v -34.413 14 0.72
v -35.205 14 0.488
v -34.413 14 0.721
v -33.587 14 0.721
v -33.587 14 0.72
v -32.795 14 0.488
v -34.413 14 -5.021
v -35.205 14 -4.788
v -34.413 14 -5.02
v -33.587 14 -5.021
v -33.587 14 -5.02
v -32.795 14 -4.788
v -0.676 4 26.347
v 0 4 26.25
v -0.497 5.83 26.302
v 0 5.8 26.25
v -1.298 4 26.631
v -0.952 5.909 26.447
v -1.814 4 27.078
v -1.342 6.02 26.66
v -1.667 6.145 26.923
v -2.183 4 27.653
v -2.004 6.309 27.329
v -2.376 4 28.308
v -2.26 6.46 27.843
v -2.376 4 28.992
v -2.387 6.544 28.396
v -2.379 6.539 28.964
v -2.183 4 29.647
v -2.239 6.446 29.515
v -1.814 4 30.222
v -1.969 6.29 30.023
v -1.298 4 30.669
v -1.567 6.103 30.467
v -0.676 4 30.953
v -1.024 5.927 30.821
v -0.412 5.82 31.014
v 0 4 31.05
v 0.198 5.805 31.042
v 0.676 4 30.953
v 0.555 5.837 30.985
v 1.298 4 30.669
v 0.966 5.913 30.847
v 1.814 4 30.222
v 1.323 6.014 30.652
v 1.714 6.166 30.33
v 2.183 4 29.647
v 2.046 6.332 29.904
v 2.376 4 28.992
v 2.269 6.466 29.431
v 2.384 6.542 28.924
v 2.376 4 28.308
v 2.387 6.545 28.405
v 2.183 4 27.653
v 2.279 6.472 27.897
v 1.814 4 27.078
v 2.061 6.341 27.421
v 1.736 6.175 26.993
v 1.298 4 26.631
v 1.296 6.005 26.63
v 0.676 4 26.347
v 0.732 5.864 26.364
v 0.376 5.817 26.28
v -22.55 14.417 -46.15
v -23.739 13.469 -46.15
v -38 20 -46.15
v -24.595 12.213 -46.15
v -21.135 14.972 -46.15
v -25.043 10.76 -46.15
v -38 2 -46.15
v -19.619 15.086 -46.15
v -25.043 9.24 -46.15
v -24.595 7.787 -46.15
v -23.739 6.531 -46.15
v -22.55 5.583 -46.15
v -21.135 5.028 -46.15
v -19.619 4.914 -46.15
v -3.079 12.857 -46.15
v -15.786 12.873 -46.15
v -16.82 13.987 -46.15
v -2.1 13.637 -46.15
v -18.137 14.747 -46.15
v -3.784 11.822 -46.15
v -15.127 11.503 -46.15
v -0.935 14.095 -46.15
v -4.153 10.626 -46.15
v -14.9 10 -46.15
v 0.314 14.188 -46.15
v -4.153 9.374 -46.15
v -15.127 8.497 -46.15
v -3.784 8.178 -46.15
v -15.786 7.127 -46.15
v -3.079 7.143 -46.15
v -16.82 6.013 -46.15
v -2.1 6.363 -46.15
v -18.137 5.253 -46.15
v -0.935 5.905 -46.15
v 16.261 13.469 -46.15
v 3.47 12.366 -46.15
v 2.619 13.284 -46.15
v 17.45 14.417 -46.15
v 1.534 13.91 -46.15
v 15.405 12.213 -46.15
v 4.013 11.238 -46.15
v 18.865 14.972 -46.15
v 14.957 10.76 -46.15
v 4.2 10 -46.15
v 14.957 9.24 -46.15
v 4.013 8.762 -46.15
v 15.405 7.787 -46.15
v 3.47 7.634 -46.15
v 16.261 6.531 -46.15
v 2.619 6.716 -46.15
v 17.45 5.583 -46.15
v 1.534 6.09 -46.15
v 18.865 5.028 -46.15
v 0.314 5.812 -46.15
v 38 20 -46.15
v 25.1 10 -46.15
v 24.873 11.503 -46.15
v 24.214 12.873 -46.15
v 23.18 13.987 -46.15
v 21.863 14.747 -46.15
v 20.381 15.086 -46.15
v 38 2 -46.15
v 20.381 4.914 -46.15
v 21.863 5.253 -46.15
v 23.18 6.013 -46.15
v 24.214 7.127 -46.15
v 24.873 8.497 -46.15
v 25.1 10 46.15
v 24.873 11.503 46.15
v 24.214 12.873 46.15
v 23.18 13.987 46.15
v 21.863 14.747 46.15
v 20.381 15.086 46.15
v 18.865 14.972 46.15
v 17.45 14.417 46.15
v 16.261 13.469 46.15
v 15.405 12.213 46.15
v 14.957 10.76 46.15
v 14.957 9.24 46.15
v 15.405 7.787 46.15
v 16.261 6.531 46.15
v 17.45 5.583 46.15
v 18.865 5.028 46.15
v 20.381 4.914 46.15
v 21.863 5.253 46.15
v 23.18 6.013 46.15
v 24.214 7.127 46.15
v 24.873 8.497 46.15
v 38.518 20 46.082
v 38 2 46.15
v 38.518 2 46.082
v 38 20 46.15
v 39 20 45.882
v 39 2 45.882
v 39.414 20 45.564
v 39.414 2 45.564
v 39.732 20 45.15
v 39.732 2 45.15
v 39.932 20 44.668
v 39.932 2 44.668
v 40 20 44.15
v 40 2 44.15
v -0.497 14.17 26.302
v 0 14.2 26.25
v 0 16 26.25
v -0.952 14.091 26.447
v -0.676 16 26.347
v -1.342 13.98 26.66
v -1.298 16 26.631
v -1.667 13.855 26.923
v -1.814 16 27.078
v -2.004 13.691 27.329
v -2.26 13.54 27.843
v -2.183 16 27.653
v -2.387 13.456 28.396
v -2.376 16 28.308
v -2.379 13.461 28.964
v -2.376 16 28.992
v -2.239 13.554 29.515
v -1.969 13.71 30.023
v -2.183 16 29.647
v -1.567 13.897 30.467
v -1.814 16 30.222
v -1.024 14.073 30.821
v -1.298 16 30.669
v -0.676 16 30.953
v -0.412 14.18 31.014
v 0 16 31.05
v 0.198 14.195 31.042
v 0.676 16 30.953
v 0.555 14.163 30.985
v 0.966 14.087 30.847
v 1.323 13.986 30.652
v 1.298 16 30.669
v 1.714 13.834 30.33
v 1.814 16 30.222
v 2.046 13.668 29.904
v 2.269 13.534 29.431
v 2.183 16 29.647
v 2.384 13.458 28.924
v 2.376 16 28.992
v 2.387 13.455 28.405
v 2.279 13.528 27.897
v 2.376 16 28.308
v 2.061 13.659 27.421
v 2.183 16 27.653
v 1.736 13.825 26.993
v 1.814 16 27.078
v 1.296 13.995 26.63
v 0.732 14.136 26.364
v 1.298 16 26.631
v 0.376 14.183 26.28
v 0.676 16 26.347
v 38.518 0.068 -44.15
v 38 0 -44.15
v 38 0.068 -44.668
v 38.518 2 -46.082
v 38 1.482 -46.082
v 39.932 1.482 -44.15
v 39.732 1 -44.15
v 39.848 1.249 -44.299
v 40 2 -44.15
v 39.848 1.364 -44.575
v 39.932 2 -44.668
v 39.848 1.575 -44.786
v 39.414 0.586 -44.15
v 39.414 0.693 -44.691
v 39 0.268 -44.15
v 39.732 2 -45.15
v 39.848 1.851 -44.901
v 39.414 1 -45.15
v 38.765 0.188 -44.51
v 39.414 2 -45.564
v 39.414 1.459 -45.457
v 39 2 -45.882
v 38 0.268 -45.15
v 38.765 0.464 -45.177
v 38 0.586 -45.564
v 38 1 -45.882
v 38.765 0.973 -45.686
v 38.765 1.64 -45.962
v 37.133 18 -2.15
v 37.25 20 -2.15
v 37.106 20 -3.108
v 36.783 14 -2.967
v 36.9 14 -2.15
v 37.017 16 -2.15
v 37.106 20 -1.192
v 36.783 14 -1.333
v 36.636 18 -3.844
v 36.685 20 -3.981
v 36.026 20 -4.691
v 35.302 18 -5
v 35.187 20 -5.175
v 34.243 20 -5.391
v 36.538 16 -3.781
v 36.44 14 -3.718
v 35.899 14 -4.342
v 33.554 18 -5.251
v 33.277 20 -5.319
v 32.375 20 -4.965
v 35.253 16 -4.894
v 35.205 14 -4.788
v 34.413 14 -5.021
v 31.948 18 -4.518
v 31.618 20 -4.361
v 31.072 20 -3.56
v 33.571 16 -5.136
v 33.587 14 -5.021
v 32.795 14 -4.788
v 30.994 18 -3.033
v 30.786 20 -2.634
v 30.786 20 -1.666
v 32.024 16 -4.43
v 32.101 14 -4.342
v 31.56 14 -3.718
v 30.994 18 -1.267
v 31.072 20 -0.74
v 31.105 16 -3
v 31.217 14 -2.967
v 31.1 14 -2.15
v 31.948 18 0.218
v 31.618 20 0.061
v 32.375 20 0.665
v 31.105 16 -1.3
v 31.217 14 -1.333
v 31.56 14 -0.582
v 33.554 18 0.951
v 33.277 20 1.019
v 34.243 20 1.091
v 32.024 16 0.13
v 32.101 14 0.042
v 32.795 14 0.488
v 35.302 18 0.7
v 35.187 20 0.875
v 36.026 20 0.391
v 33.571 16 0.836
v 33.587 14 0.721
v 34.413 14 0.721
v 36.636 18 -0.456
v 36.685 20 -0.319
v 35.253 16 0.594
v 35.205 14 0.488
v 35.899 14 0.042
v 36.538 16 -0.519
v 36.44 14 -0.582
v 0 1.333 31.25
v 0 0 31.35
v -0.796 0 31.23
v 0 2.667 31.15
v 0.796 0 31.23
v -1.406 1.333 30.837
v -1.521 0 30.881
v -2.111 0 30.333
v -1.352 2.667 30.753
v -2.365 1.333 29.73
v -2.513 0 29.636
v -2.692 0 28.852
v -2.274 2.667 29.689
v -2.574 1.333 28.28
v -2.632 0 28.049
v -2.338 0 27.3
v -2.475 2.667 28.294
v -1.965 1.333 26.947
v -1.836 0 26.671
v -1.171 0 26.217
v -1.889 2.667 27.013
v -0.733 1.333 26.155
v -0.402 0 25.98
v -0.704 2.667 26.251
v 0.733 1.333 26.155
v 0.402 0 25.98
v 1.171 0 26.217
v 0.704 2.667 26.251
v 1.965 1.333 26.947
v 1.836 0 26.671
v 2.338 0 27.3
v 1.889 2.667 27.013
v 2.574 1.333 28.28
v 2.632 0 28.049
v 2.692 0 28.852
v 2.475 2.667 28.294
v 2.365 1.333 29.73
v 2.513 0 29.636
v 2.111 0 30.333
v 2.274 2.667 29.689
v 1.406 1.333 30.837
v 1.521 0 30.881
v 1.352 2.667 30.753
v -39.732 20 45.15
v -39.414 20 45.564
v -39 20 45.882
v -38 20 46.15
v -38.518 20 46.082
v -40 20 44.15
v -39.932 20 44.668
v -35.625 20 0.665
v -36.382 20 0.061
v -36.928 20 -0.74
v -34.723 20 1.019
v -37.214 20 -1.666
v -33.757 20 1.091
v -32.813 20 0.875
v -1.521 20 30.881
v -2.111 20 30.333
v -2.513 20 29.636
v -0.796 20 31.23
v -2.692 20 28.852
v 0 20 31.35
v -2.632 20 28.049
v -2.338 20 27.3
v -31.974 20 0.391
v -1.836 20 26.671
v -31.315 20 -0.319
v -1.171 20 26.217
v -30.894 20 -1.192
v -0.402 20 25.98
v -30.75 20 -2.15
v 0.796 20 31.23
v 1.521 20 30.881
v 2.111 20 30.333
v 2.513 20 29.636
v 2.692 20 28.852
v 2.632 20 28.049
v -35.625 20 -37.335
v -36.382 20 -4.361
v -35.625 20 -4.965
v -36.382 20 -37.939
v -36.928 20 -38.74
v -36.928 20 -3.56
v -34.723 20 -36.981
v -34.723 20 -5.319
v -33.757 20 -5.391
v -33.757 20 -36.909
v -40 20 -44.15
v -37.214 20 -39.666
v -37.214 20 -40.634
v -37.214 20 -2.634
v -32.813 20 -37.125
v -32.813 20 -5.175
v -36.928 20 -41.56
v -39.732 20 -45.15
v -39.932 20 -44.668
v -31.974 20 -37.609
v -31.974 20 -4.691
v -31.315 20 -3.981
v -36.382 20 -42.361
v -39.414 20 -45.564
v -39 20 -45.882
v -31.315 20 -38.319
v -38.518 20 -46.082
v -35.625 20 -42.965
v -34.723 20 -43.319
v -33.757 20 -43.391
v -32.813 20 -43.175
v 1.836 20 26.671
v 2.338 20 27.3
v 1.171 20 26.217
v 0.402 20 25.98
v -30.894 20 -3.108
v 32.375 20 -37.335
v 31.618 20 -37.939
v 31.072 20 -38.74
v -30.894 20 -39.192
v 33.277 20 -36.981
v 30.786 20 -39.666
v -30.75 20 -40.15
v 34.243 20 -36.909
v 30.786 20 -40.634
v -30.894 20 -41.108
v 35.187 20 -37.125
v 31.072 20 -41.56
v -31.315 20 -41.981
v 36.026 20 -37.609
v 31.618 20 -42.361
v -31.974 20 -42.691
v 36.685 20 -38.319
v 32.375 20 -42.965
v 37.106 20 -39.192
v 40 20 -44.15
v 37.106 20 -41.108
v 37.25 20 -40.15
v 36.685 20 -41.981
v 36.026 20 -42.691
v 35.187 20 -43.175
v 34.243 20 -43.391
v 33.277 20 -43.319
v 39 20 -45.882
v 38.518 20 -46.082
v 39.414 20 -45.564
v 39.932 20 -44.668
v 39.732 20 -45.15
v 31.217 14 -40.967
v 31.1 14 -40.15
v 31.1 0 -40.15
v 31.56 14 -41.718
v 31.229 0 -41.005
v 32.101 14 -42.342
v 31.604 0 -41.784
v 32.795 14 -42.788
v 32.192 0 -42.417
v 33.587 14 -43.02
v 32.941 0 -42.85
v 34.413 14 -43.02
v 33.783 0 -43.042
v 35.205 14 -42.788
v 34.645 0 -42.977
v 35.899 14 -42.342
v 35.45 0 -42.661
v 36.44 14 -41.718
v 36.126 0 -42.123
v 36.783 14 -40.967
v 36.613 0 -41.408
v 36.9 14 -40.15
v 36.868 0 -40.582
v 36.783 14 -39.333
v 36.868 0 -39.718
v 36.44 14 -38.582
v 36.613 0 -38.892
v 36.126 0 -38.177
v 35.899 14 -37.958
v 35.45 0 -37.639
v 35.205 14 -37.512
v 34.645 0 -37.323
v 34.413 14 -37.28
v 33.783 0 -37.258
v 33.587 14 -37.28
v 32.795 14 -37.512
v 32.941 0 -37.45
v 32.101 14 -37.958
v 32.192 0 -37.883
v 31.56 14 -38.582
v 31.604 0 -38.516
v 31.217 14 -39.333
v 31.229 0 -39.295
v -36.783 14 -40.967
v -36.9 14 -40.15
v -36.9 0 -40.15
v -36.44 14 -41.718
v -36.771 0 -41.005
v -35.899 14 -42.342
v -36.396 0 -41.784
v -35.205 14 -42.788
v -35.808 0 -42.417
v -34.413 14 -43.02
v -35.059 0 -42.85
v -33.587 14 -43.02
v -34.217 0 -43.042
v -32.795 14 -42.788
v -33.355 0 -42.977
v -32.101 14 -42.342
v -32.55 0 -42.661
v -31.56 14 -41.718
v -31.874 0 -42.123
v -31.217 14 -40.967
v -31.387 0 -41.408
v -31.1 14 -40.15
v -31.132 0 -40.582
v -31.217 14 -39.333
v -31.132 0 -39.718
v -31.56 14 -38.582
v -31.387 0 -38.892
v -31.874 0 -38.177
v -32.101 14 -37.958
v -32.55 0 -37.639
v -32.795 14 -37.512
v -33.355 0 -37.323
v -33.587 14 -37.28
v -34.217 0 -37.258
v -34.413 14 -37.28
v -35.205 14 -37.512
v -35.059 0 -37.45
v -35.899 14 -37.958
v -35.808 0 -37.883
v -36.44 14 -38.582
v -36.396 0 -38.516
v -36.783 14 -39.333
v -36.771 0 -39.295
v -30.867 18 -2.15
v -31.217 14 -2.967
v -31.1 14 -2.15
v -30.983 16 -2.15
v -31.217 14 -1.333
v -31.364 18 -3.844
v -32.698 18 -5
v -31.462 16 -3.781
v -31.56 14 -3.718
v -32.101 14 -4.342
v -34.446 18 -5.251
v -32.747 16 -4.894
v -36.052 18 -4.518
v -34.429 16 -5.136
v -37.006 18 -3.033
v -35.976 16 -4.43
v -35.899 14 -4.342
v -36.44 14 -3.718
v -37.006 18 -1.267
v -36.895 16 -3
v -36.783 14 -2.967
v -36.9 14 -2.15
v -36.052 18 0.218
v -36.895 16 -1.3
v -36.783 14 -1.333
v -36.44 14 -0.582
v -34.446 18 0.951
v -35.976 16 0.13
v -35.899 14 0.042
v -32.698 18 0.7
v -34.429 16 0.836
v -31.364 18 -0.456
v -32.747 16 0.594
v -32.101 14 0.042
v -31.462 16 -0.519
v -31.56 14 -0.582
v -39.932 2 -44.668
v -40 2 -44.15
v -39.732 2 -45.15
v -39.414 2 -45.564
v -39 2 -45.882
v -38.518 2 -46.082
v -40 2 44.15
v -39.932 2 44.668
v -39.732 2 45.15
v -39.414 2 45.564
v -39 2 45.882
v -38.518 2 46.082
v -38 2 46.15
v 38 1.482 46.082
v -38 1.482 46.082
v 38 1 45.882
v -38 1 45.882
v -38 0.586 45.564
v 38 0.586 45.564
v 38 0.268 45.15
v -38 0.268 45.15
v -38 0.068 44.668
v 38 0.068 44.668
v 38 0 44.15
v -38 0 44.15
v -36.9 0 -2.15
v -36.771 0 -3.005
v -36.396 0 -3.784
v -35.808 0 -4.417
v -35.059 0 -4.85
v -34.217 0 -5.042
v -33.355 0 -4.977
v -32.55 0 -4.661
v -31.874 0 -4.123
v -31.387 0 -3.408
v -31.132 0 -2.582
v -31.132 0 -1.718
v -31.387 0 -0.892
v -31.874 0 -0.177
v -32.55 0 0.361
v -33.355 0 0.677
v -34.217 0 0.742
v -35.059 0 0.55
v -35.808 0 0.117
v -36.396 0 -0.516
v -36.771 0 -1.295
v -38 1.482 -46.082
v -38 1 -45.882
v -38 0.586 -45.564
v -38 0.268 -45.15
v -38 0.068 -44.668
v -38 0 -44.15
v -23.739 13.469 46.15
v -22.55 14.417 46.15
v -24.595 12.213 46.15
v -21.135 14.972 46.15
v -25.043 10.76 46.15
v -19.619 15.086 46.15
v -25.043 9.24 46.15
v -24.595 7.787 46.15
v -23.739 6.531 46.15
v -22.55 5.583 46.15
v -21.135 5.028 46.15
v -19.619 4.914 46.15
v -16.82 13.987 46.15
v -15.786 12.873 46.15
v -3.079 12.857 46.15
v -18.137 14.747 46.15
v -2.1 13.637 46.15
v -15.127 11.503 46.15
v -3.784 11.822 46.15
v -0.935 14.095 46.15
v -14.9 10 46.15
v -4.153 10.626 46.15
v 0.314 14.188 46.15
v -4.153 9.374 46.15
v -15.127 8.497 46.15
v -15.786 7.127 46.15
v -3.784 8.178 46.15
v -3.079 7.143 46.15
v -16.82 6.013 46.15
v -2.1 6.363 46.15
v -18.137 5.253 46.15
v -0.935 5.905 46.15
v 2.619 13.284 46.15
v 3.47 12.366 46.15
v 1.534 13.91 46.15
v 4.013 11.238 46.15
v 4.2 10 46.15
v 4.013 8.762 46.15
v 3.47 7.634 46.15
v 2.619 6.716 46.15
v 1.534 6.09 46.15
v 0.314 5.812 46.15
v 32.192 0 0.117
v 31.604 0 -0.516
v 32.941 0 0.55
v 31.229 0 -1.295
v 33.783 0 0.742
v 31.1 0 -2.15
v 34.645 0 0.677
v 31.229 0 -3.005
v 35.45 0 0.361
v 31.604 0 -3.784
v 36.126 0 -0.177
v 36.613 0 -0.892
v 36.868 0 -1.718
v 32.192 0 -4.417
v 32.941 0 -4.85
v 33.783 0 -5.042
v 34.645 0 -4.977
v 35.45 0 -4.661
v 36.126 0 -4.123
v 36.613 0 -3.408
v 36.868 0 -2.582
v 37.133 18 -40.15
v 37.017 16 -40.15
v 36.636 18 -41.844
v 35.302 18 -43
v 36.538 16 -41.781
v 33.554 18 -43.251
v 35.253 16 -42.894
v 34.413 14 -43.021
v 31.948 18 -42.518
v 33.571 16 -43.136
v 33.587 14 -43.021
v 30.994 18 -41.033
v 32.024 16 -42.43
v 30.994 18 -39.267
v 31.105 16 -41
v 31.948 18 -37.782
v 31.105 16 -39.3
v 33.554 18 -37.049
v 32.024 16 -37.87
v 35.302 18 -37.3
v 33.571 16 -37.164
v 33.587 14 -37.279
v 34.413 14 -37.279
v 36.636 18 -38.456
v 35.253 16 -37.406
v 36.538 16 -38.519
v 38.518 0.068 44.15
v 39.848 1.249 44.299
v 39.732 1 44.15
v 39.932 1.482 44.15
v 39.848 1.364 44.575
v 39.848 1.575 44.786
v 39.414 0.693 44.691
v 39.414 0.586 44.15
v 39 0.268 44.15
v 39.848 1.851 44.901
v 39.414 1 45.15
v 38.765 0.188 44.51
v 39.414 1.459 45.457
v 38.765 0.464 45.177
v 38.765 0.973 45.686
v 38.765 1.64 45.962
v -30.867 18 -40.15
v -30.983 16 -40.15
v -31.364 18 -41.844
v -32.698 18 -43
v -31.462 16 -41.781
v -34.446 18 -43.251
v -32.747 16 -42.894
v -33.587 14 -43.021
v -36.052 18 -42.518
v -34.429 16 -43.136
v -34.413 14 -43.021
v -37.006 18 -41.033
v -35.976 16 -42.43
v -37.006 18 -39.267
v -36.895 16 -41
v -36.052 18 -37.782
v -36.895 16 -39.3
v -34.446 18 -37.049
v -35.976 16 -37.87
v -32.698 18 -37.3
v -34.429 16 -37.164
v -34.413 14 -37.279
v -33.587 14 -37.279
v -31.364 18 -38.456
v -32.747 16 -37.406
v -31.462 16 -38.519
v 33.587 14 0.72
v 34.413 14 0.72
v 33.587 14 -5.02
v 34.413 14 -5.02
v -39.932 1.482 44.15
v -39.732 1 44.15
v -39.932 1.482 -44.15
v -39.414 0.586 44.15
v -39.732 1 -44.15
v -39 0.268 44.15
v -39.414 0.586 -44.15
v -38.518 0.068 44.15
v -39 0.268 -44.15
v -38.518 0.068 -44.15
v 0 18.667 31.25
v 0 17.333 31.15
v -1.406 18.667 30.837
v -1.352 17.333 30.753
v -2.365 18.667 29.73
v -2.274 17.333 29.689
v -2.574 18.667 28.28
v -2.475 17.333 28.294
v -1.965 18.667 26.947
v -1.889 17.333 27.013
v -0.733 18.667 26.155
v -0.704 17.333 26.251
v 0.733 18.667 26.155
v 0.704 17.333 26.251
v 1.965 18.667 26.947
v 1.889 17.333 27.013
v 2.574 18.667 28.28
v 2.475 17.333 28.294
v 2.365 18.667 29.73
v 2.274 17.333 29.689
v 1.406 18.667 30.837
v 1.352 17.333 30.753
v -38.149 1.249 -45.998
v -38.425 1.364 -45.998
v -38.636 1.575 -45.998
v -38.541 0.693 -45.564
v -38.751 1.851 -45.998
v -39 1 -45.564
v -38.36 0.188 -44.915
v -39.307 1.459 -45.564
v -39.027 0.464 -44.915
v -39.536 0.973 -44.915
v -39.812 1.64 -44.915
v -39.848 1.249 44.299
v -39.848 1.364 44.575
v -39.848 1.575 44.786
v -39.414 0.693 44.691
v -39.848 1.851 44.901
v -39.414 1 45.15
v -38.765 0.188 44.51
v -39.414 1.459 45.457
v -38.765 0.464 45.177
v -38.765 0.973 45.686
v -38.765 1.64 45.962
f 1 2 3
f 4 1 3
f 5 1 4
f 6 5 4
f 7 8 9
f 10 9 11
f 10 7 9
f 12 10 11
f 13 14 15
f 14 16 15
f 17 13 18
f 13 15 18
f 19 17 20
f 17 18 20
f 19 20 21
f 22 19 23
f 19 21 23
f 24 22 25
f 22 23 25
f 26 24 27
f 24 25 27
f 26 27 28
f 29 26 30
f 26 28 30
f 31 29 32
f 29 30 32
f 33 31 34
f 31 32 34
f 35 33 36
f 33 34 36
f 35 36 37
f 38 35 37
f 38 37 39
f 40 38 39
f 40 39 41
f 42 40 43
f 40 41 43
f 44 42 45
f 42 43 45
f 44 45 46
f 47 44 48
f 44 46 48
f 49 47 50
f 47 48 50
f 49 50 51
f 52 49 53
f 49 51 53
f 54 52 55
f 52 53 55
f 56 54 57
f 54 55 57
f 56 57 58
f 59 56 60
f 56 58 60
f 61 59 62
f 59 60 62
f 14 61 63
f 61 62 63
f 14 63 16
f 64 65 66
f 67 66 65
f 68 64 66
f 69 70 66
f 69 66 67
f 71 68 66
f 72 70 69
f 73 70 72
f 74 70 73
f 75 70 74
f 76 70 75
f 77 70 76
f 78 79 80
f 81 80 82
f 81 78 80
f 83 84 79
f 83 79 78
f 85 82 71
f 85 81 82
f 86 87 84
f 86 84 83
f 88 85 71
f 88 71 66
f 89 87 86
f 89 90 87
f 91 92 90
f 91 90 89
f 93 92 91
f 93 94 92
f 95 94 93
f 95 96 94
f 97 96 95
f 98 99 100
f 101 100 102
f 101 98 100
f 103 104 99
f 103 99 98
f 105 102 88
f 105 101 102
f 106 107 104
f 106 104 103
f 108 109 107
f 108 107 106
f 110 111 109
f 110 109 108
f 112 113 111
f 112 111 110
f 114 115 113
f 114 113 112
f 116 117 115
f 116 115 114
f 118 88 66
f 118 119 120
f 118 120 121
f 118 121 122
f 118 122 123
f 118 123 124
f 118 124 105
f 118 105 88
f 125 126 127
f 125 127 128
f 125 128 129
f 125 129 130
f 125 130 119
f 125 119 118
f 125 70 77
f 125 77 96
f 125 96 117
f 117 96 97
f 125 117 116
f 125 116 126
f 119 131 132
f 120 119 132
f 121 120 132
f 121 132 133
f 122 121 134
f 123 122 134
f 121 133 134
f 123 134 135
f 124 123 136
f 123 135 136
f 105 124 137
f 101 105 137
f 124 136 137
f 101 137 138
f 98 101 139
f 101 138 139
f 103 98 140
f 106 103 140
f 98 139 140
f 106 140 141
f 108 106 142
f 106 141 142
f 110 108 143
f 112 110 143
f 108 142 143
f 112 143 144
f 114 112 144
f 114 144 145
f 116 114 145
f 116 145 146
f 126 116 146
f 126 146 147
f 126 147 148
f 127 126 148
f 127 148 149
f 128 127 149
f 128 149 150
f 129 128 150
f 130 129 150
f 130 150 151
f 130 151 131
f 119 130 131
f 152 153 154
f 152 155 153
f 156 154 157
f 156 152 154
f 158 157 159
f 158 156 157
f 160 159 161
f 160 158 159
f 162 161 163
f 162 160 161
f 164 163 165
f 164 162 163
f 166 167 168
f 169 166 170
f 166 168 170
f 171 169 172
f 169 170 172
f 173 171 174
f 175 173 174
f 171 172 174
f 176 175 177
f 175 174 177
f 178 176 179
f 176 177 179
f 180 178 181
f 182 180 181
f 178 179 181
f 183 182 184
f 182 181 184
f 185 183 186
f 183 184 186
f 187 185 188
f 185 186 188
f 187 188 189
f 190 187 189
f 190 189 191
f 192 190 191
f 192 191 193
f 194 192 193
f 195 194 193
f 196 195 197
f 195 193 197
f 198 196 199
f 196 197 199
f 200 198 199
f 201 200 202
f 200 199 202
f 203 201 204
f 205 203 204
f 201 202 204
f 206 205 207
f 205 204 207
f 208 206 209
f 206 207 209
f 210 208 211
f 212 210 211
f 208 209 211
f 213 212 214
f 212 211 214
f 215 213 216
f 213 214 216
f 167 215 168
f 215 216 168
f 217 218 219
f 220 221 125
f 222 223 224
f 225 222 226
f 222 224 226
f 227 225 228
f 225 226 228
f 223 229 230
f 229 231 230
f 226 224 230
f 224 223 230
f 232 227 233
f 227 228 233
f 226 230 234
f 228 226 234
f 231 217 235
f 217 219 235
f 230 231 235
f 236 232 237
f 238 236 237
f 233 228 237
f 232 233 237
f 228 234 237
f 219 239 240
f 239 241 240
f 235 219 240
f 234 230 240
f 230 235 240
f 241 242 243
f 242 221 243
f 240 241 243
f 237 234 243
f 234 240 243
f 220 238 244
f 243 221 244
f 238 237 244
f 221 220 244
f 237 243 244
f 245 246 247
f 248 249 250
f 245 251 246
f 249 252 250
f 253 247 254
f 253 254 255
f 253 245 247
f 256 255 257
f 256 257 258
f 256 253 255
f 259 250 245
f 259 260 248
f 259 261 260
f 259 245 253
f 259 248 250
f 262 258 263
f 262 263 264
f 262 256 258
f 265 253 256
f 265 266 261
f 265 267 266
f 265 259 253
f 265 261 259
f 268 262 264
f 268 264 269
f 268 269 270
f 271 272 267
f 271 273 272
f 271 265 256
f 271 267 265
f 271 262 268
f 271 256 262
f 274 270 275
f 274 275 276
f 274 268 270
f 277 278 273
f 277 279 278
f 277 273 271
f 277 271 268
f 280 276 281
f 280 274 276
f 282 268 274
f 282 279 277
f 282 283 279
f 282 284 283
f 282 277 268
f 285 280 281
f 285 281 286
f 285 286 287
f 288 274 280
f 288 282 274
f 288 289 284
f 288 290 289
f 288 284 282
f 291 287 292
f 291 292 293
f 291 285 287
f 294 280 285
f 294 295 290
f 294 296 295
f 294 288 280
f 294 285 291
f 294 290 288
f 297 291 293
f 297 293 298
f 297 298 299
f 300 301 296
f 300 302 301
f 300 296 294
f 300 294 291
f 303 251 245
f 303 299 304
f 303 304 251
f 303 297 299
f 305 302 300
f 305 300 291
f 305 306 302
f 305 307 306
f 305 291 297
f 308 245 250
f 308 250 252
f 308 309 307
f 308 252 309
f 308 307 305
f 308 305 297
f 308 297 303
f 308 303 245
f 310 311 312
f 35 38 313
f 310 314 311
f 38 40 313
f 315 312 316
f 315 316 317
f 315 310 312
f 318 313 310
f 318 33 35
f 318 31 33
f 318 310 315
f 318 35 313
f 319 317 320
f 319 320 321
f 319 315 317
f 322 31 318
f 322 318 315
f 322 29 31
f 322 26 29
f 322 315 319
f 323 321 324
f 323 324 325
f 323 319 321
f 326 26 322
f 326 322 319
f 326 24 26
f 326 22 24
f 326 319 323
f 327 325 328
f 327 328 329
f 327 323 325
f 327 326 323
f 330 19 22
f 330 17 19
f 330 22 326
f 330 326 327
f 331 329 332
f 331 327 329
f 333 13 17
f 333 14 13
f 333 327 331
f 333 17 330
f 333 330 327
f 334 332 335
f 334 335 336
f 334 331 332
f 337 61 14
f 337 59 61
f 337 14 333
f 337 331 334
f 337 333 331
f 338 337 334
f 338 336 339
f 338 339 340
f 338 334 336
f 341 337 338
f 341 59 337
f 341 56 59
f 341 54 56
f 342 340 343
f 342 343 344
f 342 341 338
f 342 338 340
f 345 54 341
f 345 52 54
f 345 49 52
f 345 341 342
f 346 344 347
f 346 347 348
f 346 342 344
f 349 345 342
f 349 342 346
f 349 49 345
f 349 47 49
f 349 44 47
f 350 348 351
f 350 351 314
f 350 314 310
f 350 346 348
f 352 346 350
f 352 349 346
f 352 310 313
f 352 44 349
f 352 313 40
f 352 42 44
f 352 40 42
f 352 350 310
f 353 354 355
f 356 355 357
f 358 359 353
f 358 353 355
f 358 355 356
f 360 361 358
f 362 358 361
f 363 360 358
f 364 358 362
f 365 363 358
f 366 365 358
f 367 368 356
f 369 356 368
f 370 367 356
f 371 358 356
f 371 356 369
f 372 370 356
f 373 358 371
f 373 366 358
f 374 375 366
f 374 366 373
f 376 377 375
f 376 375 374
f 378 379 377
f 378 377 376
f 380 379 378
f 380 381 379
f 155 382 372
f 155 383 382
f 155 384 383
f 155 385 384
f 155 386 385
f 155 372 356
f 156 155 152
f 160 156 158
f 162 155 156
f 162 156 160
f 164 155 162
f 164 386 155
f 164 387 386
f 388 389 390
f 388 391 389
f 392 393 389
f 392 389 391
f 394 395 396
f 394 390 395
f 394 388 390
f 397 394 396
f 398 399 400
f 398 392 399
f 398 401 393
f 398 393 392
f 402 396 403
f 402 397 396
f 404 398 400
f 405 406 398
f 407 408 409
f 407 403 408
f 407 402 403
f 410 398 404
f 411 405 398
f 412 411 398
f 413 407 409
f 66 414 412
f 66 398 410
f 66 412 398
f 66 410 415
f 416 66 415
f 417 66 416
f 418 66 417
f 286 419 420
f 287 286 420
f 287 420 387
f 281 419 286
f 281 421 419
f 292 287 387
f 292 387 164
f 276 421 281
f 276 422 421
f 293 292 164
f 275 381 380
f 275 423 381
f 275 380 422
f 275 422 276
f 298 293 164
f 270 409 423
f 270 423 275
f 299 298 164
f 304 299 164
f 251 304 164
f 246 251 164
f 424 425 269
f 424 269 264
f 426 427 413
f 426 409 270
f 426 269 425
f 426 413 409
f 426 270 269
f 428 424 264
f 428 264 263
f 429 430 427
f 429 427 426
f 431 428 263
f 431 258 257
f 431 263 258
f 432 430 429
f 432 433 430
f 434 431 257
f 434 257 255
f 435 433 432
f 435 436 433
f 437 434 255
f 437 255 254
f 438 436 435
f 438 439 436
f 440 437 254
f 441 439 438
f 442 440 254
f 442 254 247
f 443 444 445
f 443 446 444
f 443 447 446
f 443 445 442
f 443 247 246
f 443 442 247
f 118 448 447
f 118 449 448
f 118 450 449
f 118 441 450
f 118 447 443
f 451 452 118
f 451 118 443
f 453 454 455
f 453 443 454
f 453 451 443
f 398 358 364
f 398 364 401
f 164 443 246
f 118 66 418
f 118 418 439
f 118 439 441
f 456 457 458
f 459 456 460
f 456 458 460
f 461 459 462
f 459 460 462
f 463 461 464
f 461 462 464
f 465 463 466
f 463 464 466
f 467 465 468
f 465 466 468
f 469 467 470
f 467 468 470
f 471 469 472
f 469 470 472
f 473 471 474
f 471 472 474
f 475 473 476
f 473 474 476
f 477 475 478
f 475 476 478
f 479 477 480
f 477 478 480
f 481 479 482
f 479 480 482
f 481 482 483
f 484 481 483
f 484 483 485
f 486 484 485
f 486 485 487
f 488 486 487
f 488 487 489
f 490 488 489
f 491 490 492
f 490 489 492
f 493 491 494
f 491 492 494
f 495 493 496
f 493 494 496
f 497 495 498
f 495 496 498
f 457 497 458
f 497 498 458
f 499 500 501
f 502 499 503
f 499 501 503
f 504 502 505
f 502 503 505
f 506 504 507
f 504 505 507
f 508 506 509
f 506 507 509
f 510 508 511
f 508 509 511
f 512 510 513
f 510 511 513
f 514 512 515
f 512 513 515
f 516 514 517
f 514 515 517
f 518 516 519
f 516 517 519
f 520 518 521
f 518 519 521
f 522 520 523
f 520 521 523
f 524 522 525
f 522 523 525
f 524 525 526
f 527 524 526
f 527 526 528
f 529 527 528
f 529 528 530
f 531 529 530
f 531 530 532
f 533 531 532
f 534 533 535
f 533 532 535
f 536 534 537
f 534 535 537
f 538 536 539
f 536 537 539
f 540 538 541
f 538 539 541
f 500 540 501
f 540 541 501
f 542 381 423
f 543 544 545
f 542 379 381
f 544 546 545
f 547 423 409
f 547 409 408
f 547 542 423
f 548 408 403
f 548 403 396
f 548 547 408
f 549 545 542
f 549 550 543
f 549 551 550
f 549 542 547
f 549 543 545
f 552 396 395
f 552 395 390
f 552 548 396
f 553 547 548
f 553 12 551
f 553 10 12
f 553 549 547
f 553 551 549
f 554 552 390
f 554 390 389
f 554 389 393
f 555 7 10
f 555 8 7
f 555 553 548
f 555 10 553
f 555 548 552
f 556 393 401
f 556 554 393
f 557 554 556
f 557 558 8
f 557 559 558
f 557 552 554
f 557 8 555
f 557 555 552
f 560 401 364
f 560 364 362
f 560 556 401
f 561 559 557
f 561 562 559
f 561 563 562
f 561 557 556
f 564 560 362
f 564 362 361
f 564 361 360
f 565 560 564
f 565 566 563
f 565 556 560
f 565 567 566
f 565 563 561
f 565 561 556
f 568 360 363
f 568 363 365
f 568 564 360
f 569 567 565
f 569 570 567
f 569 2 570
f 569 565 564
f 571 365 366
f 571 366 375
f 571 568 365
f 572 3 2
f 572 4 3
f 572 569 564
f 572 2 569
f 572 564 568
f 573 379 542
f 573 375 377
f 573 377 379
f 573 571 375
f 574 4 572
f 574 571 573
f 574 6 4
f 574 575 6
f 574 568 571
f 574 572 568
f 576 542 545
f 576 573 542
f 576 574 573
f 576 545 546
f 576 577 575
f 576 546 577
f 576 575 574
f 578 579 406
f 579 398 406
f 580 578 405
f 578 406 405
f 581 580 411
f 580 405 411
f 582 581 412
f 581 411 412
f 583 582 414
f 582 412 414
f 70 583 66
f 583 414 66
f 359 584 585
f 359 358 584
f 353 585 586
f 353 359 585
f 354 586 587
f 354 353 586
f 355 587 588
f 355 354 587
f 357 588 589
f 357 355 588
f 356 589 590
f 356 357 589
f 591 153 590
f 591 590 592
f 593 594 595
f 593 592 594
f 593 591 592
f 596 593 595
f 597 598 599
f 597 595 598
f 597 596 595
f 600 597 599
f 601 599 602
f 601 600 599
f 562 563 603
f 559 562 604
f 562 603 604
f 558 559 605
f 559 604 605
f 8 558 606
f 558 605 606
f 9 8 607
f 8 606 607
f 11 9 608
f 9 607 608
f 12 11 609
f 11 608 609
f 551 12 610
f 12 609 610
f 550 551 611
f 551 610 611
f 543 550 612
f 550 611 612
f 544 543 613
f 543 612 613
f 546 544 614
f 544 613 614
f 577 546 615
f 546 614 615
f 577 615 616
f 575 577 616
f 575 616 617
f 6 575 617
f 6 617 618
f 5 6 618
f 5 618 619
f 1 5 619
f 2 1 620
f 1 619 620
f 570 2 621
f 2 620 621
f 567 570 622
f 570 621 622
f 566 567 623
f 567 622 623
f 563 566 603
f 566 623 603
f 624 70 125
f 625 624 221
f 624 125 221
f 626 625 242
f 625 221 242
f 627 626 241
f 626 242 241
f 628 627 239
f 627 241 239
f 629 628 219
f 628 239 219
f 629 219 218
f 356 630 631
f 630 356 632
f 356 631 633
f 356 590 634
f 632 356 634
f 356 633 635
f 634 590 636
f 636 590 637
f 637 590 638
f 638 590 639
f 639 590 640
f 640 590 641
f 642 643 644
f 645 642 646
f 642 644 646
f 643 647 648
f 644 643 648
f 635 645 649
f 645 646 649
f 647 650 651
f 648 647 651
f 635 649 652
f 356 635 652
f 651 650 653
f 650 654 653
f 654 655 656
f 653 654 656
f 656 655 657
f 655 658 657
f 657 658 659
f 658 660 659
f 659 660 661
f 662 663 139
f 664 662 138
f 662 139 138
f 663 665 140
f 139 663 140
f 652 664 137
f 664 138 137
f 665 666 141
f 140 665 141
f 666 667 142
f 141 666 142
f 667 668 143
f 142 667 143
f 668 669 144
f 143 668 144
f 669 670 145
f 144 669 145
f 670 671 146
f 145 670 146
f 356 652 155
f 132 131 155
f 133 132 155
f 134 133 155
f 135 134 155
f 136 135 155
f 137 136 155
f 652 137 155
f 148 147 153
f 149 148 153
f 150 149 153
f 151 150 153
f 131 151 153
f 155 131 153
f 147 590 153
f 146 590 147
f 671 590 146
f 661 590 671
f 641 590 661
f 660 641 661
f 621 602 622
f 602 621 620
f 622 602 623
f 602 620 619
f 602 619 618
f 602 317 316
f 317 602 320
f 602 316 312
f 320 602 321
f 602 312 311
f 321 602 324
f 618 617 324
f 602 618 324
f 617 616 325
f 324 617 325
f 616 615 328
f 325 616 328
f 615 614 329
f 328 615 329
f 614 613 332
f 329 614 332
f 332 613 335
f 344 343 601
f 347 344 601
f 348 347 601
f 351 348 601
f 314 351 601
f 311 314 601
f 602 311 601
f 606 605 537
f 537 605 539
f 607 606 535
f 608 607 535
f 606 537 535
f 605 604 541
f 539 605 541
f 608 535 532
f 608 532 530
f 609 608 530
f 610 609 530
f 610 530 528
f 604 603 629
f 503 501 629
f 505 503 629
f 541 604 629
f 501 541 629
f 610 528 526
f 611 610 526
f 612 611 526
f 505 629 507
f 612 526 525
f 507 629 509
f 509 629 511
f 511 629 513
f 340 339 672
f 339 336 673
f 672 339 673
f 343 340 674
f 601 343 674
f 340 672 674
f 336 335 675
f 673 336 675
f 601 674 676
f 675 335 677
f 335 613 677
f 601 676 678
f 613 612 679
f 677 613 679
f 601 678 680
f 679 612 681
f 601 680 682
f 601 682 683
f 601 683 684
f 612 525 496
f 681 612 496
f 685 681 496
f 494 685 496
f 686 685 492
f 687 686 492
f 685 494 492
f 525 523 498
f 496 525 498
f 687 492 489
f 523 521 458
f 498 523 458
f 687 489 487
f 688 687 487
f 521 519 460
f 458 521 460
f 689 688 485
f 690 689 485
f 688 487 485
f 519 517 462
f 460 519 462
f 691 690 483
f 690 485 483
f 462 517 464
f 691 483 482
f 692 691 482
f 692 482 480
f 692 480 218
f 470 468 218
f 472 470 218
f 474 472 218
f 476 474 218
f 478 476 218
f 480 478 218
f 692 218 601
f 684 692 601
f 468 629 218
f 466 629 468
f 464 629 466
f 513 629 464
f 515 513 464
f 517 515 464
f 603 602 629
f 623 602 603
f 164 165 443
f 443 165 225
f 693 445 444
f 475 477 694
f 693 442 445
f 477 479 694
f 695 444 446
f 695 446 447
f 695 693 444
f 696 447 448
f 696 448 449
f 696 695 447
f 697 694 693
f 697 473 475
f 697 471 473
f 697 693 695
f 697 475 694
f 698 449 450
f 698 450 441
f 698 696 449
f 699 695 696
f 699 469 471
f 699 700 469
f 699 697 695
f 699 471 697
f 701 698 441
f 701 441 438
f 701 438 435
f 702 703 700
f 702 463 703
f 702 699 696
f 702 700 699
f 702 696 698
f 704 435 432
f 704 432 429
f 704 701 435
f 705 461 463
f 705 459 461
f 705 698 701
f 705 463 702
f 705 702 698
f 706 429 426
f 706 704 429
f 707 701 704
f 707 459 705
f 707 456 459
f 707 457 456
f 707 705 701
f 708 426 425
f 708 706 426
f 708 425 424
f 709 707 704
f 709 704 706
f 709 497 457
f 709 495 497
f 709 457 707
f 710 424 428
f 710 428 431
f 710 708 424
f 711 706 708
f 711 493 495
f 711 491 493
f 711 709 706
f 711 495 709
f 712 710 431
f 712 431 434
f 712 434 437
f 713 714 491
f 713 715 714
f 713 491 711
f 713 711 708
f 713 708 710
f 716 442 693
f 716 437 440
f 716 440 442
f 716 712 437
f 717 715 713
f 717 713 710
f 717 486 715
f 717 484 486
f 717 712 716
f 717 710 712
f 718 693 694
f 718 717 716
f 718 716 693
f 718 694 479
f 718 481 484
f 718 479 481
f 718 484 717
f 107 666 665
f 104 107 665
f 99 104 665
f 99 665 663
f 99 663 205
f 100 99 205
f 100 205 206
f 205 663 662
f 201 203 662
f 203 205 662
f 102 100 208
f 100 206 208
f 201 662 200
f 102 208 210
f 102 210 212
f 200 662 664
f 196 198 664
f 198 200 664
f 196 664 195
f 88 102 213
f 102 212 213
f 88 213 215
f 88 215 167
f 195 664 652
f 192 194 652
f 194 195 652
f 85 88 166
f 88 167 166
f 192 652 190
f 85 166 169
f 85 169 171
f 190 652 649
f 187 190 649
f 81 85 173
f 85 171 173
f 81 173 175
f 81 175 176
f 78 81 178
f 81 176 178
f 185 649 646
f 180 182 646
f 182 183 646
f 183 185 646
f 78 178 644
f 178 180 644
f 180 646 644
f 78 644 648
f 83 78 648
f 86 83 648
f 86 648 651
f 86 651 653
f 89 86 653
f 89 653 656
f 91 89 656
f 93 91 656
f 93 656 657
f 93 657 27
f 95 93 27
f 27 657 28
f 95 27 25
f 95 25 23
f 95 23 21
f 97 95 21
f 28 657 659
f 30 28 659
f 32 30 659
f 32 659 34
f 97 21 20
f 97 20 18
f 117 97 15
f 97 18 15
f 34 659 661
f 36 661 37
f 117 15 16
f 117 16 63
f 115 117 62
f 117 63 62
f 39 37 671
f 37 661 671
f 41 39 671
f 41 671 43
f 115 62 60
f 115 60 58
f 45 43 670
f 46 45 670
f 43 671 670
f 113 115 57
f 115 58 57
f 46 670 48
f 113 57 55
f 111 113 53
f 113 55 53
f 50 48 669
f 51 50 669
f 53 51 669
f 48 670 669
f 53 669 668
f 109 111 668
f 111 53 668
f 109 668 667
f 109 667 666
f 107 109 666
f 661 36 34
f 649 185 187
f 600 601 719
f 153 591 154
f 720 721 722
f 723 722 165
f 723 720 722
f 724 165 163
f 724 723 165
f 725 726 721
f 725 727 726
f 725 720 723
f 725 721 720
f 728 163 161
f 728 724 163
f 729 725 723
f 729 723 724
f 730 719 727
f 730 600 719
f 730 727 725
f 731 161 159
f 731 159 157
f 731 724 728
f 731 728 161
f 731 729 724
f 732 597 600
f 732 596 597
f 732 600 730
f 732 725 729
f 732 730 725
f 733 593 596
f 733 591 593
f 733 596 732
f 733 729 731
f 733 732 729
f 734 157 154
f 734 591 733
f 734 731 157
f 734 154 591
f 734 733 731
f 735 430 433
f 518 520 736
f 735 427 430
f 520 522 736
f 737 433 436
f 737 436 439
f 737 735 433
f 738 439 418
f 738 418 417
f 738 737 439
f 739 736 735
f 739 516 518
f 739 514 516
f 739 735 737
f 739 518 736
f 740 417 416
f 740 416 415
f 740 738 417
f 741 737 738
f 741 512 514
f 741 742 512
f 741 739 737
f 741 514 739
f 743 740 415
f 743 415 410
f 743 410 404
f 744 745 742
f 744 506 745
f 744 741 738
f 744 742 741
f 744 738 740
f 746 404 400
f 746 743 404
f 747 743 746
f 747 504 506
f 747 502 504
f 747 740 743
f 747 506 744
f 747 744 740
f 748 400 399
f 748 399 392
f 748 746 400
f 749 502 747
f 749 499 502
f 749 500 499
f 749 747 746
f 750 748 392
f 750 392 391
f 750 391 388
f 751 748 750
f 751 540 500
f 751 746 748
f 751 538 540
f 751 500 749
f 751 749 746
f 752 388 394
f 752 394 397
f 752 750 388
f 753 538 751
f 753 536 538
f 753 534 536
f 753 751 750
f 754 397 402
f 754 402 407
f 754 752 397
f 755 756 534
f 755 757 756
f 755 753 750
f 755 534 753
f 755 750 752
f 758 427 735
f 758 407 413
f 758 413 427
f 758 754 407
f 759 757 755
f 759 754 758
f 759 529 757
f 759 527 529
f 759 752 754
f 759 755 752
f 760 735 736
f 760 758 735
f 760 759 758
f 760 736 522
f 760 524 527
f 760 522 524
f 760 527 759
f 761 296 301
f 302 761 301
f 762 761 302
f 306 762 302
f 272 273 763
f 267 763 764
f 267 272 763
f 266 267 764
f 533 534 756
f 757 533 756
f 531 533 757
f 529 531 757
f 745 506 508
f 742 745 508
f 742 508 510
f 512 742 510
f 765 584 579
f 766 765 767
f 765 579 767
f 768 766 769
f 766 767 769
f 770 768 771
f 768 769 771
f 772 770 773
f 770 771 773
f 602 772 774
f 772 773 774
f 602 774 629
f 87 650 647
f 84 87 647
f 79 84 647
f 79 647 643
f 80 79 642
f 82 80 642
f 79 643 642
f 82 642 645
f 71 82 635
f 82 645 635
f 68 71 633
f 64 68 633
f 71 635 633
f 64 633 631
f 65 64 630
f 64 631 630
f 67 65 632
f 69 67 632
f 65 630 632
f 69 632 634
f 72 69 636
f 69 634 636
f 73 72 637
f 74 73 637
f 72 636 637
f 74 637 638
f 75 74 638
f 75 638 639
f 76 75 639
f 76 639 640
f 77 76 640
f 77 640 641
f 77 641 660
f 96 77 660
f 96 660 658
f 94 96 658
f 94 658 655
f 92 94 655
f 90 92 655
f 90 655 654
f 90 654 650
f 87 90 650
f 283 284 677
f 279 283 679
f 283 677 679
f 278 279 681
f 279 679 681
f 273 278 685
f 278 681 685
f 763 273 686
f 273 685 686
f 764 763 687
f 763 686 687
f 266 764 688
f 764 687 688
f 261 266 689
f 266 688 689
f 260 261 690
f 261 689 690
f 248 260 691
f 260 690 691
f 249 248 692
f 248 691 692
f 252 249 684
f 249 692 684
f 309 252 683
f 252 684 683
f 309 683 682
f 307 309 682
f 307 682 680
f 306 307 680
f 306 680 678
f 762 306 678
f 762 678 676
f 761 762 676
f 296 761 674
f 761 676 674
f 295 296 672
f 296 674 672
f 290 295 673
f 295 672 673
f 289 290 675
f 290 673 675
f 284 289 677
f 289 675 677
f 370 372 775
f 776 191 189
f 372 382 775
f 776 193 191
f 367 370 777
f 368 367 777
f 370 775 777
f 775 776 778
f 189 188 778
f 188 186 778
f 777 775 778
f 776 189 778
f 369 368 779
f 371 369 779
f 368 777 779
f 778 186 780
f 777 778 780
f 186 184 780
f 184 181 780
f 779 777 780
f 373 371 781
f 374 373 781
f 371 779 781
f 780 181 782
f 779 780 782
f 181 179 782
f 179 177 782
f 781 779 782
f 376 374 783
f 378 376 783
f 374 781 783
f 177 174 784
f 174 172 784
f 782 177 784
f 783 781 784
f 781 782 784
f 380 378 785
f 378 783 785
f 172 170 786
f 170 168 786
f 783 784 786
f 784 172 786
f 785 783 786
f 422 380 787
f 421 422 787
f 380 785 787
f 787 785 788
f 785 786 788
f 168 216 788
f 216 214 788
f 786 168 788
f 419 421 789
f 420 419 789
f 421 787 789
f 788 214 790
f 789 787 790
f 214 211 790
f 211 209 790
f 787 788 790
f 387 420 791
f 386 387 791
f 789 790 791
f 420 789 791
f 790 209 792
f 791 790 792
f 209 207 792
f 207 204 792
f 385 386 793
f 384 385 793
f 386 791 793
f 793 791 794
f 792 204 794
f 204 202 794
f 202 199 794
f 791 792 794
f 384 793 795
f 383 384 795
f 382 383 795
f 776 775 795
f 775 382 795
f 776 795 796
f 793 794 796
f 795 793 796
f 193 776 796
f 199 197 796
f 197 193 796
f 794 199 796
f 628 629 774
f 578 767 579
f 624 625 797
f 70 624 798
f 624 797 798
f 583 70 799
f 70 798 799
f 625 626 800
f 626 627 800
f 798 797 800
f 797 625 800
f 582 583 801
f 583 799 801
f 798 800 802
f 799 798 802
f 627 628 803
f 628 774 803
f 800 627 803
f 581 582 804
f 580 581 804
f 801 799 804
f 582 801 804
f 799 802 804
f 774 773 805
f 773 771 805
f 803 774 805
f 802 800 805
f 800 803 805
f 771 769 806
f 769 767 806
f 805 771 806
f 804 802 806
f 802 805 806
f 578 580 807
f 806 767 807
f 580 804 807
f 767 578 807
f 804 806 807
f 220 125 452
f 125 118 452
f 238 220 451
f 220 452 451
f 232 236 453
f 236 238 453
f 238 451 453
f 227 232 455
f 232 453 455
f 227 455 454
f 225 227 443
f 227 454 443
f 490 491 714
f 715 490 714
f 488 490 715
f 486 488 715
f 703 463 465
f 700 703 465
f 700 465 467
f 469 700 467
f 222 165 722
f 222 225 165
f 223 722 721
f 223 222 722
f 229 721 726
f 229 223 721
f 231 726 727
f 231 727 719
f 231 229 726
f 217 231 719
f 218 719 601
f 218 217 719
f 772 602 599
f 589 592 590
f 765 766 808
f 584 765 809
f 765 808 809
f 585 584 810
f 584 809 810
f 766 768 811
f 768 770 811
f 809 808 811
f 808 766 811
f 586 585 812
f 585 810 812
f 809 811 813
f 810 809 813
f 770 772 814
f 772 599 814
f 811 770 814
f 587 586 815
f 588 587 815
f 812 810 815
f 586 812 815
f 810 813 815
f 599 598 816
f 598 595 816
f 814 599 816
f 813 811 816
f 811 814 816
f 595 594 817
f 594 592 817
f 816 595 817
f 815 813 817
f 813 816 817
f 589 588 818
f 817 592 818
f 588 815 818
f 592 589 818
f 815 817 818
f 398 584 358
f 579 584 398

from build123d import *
from OCP.BRepFilletAPI import BRepFilletAPI_MakeChamfer

# Parameters (mm, degrees)
SKETCH1_W                 = 80
SKETCH1_H                 = 92.3
BOSS_EXTRUDE1_DEPTH       = 20
HOLE1_D                   = 5.8
HOLE1_CBORE_D             = 6.5
HOLE1_CBORE_DEPTH         = 6
CHAMFER1_SIZE             = 6
CHAMFER1_SIZE_2           = 0.35
SKETCH4_R                 = 4.2
SKETCH4_R_2               = 5.1
CUT_EXTRUDE1_DEPTH        = 103.563590031
HOLE2_D                   = 4.8
HOLE2_CBORE_D             = 5.4
HOLE2_CBORE_DEPTH         = 4
CHAMFER2_SIZE2            = 0.3
CHAMFER2_SIZE             = 4
CHAMFER2_OF_MIRROR1_SIZE2 = 0.3
CHAMFER2_OF_MIRROR1_SIZE  = 4
FILLET1_R                 = 2


with BuildPart() as part:
    # Sketch1 → Boss-Extrude1 (new body)
    with BuildSketch(Plane(origin=(0, 0, 0), x_dir=(1, 0, 0), z_dir=(0, 1, 0))):
        Rectangle(SKETCH1_W, SKETCH1_H)
    extrude(amount=BOSS_EXTRUDE1_DEPTH)

    # Hole1 (through all)
    with Locations(Plane(origin=(0, 20, 0), x_dir=(1, 0, 0), z_dir=(0, 1, 0))):
        with Locations((-34, 40.15), (34, 40.15), (34, 2.15), (-34, 2.15)):
            CounterBoreHole(HOLE1_D / 2, HOLE1_CBORE_D / 2, HOLE1_CBORE_DEPTH)

    # Chamfer1
    chamfer1_edges_1 = [part.edges().sort_by_distance(p)[0] for p in [
        (-37.25, 14, -2.15),
    ]]
    chamfer1_side_1 = [part.faces().sort_by_distance(p)[0] for p in [
        (-37.25, 14.007, -2.15),
    ]]
    chamfer1_edges_2 = [part.edges().sort_by_distance(p)[0] for p in [
        (30.75, 14, -2.15),
    ]]
    chamfer1_side_2 = [part.faces().sort_by_distance(p)[0] for p in [
        (30.75, 14.007, -2.15),
    ]]
    chamfer1_edges_3 = [part.edges().sort_by_distance(p)[0] for p in [
        (30.75, 14, -40.15),
    ]]
    chamfer1_side_3 = [part.faces().sort_by_distance(p)[0] for p in [
        (30.75, 14.007, -40.15),
    ]]
    chamfer1_edges_4 = [part.edges().sort_by_distance(p)[0] for p in [
        (-37.25, 14, -40.15),
    ]]
    chamfer1_side_4 = [part.faces().sort_by_distance(p)[0] for p in [
        (-37.25, 14.007, -40.15),
    ]]
    chamfer1 = BRepFilletAPI_MakeChamfer(part.part.solid().wrapped)
    for e in chamfer1_edges_1:
        chamfer1.Add(CHAMFER1_SIZE - 0.0001, CHAMFER1_SIZE_2 - 0.0001, e.wrapped, chamfer1_side_1[0].wrapped)
    for e in chamfer1_edges_2:
        chamfer1.Add(CHAMFER1_SIZE - 0.0001, CHAMFER1_SIZE_2 - 0.0001, e.wrapped, chamfer1_side_2[0].wrapped)
    for e in chamfer1_edges_3:
        chamfer1.Add(CHAMFER1_SIZE - 0.0001, CHAMFER1_SIZE_2 - 0.0001, e.wrapped, chamfer1_side_3[0].wrapped)
    for e in chamfer1_edges_4:
        chamfer1.Add(CHAMFER1_SIZE - 0.0001, CHAMFER1_SIZE_2 - 0.0001, e.wrapped, chamfer1_side_4[0].wrapped)
    add(Compound.cast(chamfer1.Shape()), mode=Mode.REPLACE)  # a hair under: the kernel refuses the full size

    # Sketch4 → Cut-Extrude1 (cut, through all)
    with BuildSketch(Plane.XY.offset(46.15)):
        with Locations((0, 10)):
            Circle(SKETCH4_R)
        with Locations((-20, 10)):
            Circle(SKETCH4_R_2)
        with Locations((20, 10)):
            Circle(SKETCH4_R_2)
    extrude(amount=-CUT_EXTRUDE1_DEPTH, mode=Mode.SUBTRACT)

    # Hole2 (through all)
    with Locations(Plane(origin=(-40, 0, 0), x_dir=(0, 0, 1), z_dir=(0, -1, 0))):
        with Locations((28.65, -40)):
            hole2 = CounterBoreHole(HOLE2_D / 2, HOLE2_CBORE_D / 2, HOLE2_CBORE_DEPTH)

    # Chamfer2
    chamfer2_edges = [part.edges().sort_by_distance(p)[0] for p in [
        (0, 4, 25.95),
    ]]
    chamfer2_side = [part.faces().sort_by_distance(p)[0] for p in [
        (0, 3.994, 25.95),
    ]]
    chamfer(chamfer2_edges, length=CHAMFER2_SIZE - 0.0001, length2=CHAMFER2_SIZE2 - 0.0001, reference=chamfer2_side[0])  # a hair under: the kernel refuses the full size

    # Mirror1: Hole2 across plane
    add(hole2.mirror(Plane.ZX.offset(10)), mode=Mode.SUBTRACT)

    # Chamfer2 of Mirror1
    chamfer2_of_mirror1_edges = [part.edges().sort_by_distance(p)[0] for p in [
        (0, 16, 25.95),
    ]]
    chamfer2_of_mirror1_side = [part.faces().sort_by_distance(p)[0] for p in [
        (0, 16.006, 25.95),
    ]]
    chamfer(chamfer2_of_mirror1_edges, length=CHAMFER2_OF_MIRROR1_SIZE - 0.0001, length2=CHAMFER2_OF_MIRROR1_SIZE2 - 0.0001, reference=chamfer2_of_mirror1_side[0])  # a hair under: the kernel refuses the full size

    # Fillet1
    fillet1_edges = [part.edges().sort_by_distance(p)[0] for p in [
        (0, 0, 46.15),
        (-40, 0, 0),
        (0, 0, -46.15),
        (40, 0, 0),
        (40, 10, 46.15),
        (-40, 10, 46.15),
        (-40, 10, -46.15),
        (40, 10, -46.15),
    ]]
    fillet(fillet1_edges, radius=FILLET1_R)


solid = part.part
